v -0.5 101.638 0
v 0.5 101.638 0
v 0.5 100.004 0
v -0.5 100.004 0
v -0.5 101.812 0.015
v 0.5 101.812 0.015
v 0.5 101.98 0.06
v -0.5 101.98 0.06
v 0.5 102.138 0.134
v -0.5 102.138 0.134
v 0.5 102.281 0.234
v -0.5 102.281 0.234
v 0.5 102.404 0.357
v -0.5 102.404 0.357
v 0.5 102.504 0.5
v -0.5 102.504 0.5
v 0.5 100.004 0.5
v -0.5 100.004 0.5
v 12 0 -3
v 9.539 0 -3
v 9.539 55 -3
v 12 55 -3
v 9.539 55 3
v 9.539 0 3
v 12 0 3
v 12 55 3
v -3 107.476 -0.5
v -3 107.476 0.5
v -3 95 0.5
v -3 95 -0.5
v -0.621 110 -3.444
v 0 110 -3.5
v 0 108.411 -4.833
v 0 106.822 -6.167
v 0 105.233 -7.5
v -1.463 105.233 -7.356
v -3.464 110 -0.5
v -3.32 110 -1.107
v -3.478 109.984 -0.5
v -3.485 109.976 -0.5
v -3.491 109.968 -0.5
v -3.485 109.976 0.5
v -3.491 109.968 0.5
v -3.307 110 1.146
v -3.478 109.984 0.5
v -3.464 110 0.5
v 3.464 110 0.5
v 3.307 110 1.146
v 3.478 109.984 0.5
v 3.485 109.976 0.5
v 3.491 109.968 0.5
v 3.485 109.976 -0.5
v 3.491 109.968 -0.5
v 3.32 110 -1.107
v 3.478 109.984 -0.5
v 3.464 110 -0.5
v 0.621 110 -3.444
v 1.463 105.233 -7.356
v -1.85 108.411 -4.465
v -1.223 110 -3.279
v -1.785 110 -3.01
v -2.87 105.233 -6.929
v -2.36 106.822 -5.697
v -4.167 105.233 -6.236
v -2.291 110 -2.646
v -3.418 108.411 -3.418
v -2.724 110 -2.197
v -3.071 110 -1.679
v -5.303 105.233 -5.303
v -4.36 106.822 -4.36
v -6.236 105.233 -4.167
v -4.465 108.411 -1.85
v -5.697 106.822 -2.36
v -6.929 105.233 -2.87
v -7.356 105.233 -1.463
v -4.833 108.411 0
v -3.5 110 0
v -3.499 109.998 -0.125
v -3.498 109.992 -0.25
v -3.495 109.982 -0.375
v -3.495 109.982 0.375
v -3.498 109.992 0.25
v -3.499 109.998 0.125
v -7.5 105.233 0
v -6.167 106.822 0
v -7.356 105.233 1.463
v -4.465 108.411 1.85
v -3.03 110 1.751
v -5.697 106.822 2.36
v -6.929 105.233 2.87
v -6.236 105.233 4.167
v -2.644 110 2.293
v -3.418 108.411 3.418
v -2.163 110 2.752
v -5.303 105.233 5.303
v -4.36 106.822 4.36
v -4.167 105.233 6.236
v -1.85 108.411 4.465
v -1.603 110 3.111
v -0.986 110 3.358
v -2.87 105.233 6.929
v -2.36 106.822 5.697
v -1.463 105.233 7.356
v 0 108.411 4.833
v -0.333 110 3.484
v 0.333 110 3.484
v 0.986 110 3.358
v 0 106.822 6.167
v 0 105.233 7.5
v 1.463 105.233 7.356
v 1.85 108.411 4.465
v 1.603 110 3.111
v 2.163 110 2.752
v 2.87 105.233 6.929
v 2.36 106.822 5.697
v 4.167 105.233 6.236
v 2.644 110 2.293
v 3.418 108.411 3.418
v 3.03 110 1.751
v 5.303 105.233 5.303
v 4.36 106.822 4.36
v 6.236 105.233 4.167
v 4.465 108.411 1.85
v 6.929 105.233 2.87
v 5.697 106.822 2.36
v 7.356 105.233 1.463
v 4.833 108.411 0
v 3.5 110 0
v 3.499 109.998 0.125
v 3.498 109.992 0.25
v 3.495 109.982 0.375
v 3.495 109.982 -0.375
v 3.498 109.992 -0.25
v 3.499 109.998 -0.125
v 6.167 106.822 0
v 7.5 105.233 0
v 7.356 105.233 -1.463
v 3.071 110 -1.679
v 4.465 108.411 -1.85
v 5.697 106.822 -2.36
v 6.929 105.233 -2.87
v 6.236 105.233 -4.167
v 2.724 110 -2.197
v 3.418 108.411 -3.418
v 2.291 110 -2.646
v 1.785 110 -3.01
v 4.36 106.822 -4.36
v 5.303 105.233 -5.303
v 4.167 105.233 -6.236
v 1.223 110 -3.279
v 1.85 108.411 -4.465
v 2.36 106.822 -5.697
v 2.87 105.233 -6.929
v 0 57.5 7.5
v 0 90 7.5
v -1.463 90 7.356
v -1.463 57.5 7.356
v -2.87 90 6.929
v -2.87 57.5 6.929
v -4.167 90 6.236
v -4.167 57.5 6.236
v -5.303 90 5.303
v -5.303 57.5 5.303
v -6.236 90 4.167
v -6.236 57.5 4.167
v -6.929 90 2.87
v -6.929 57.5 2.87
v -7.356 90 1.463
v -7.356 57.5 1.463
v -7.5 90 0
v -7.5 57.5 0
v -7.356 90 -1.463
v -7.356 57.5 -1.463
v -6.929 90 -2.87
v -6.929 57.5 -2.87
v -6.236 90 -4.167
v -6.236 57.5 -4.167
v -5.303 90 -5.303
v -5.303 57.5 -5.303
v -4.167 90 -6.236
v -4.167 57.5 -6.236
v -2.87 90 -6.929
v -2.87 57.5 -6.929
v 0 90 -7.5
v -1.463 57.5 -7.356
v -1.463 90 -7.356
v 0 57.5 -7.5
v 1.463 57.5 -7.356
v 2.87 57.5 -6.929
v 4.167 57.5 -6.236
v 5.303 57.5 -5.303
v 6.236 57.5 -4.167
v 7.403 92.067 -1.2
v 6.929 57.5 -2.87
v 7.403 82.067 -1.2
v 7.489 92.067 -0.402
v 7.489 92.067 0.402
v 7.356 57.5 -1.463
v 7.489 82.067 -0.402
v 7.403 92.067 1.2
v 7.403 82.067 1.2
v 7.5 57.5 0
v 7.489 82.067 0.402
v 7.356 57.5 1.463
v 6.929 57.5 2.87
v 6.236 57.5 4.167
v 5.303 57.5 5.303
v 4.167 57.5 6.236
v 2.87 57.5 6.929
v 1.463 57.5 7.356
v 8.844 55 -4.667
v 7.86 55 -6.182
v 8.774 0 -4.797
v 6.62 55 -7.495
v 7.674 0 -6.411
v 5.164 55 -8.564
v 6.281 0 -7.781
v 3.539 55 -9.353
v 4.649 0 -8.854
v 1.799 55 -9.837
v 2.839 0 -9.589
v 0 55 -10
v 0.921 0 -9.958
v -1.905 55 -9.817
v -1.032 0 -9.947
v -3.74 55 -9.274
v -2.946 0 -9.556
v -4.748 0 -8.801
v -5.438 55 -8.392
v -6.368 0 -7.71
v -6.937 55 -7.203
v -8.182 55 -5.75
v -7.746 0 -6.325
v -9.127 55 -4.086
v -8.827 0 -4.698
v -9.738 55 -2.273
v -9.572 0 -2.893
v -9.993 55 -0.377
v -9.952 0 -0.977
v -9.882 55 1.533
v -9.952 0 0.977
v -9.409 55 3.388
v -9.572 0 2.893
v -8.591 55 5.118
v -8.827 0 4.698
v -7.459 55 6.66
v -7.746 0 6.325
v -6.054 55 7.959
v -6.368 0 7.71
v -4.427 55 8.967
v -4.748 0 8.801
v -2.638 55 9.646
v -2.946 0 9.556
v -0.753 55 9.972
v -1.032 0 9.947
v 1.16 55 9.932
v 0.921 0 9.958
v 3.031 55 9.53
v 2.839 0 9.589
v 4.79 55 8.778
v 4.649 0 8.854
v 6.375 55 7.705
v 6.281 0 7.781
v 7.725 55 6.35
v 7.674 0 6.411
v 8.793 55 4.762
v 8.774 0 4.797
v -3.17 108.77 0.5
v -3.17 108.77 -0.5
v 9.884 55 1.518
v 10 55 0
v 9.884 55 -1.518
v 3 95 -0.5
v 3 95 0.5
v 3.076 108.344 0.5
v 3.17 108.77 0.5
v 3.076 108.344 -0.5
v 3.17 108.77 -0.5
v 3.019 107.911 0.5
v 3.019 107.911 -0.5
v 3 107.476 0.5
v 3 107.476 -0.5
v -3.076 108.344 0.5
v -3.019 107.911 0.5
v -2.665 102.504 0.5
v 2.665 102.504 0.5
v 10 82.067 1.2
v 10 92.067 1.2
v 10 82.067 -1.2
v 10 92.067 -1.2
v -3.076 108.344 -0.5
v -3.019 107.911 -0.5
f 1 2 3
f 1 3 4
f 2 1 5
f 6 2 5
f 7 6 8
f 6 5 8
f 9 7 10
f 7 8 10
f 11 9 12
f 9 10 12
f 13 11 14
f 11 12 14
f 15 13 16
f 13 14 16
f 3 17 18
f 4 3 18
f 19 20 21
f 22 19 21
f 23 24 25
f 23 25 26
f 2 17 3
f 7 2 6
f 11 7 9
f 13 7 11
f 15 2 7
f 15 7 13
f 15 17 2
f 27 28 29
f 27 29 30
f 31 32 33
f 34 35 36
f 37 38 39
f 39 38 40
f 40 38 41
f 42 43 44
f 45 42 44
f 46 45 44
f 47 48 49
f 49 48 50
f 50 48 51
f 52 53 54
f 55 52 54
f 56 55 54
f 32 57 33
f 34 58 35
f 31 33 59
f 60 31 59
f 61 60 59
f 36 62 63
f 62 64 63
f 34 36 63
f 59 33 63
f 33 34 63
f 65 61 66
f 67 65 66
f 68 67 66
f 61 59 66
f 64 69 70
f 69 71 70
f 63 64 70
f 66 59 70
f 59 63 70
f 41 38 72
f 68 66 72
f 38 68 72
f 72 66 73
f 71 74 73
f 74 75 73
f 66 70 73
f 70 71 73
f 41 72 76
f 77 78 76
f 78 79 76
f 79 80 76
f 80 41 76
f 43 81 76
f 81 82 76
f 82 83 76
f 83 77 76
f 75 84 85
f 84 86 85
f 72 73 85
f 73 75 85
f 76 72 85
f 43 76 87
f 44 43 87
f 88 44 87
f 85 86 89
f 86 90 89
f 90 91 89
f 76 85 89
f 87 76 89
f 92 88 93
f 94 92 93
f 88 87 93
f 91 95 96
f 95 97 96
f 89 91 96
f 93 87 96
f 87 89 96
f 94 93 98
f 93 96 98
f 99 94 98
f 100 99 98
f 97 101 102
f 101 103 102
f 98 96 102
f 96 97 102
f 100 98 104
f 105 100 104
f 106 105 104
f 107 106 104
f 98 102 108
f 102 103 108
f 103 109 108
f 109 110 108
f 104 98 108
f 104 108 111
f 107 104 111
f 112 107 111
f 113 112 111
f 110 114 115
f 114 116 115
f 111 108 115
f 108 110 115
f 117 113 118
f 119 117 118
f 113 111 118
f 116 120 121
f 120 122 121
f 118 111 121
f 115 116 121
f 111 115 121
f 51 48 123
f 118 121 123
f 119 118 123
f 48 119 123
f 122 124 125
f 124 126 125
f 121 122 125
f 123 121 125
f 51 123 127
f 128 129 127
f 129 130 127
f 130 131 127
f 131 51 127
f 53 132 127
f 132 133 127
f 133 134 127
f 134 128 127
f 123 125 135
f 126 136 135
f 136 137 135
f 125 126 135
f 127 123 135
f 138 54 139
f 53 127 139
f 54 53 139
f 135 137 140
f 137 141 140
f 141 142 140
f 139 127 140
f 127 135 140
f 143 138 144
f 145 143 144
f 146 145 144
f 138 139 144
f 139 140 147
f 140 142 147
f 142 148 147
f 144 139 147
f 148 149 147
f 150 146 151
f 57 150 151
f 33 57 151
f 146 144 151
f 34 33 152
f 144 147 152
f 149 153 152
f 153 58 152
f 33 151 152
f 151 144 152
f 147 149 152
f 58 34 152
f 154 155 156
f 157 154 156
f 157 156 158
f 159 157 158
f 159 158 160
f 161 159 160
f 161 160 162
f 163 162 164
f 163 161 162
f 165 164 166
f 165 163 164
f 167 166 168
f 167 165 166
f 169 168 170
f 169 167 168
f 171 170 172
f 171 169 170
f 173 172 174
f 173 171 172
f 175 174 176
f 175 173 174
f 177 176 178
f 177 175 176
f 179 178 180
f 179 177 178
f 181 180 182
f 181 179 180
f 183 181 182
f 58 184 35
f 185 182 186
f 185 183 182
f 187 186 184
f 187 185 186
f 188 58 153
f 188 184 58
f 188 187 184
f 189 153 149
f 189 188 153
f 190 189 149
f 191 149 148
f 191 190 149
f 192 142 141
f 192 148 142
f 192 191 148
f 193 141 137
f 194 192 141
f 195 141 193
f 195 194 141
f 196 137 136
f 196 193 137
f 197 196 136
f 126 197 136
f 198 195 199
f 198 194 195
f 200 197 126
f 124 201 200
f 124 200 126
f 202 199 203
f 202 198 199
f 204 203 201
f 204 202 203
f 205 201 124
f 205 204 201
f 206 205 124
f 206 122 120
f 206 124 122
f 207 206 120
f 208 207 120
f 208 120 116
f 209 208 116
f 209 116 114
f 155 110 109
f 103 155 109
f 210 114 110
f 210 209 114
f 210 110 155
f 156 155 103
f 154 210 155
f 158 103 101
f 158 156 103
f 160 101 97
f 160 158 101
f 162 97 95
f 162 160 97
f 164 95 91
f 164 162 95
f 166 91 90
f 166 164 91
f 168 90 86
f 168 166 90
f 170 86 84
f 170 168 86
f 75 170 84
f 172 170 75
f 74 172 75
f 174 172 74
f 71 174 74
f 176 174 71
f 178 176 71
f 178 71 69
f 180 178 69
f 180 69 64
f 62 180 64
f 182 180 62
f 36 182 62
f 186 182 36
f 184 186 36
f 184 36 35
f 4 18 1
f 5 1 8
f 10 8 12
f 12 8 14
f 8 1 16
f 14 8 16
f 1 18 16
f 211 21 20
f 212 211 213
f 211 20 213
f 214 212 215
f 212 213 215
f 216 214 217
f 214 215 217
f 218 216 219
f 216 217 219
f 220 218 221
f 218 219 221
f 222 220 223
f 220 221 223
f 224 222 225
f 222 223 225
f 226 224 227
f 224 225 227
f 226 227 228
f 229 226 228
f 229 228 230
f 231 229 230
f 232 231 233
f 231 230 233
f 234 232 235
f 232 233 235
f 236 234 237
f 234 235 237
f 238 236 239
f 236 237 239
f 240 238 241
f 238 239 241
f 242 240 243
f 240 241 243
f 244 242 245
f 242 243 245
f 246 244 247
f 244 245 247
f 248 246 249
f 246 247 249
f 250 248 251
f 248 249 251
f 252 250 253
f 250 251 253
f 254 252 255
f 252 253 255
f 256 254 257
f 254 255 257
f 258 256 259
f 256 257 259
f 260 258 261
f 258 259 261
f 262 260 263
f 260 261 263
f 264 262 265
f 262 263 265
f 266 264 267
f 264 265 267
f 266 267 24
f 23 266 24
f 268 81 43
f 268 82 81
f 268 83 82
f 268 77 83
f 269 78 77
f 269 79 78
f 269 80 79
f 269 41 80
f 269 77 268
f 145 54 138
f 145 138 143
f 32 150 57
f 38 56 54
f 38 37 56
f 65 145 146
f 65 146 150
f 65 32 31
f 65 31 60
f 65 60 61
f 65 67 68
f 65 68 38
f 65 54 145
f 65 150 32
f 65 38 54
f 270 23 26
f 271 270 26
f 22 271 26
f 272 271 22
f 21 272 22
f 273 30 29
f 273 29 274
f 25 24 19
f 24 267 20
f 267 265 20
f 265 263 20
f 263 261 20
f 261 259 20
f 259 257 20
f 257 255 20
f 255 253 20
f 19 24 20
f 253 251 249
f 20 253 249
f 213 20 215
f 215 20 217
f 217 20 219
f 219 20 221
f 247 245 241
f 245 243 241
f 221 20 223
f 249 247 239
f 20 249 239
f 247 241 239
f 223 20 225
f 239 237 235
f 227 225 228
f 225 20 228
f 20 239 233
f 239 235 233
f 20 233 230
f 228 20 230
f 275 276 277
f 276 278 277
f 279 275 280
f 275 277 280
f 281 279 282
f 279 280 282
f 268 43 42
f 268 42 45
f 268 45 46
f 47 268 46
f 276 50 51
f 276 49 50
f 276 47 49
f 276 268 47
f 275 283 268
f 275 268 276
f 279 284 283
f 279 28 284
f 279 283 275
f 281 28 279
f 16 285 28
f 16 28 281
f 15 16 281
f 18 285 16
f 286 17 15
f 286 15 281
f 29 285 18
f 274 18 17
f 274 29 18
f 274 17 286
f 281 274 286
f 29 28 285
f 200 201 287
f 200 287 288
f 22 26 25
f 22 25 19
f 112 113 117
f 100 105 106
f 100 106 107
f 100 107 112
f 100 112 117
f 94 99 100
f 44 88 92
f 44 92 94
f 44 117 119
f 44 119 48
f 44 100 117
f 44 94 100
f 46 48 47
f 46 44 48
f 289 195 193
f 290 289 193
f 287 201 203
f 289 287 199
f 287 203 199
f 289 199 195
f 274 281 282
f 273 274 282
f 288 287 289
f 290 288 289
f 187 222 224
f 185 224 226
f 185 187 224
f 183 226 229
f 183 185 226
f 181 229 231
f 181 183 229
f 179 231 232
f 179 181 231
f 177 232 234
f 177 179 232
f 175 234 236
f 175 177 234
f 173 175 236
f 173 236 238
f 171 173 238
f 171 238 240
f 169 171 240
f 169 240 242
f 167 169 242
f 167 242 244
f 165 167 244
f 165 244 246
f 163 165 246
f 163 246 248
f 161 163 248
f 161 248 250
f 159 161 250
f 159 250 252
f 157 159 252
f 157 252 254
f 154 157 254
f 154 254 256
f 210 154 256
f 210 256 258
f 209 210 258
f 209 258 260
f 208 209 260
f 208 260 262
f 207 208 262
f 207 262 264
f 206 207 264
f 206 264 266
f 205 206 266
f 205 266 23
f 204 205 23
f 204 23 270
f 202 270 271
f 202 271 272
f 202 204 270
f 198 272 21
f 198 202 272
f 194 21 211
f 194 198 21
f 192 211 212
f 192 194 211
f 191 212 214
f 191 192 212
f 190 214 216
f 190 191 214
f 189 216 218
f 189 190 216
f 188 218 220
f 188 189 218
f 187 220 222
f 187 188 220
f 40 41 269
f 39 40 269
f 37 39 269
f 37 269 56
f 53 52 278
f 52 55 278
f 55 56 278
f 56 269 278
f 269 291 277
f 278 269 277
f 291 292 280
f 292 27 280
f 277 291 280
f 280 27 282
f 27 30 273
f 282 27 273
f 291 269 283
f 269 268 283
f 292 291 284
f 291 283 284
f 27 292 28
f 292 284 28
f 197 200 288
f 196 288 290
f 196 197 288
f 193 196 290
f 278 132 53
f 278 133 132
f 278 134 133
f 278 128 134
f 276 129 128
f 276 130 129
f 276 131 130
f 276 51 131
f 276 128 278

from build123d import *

# Parameters (mm, degrees)
SKETCH1_R           = 10
BOSS_EXTRUDE1_DEPTH = 60
SKETCH2_R           = 7.5
BOSS_EXTRUDE2_DEPTH = 30
CHAMFER2_SIZE       = 5
SKETCH3_R           = 7.5
BOSS_EXTRUDE3_DEPTH = 20
CHAMFER3_SIZE       = 4
CHAMFER3_SIZE2      = 4.76701437
SKETCH5_W           = 6
SKETCH5_H           = 55
BOSS_EXTRUDE5_DEPTH = 12
SKETCH6_W           = 2.4
SKETCH6_H           = 10
BOSS_EXTRUDE6_DEPTH = 10
SKETCH13_W          = 6
SKETCH13_H          = 1
CUT_EXTRUDE2_DEPTH  = 10
SKETCH14_W          = 6
SKETCH14_H          = 1
CUT_EXTRUDE3_DEPTH  = 5
CHAMFER22_SIZE      = 0.5
CHAMFER22_SIZE_2    = 1.866025404
SKETCH17_W          = 1
SKETCH17_H          = 2.5
BOSS_EXTRUDE7_DEPTH = 0.5
FILLET1_R           = 1
FILLET2_R           = 5


with BuildPart() as part:
    # Sketch1 → Boss-Extrude1 (new body)
    with BuildSketch(Plane(origin=(0, 0, 0), x_dir=(1, 0, 0), z_dir=(0, 1, 0))):
        with Locations(Location((0, 0, 0), (0, 0, 90))):
            Circle(SKETCH1_R)
    extrude(amount=BOSS_EXTRUDE1_DEPTH)

    # Sketch2 → Boss-Extrude2 (add)
    with BuildSketch(Plane(origin=(0, 60, 0), x_dir=(1, 0, 0), z_dir=(0, 1, 0))):
        with Locations(Location((0, 0, 0), (0, 0, 270))):
            Circle(SKETCH2_R)
    extrude(amount=BOSS_EXTRUDE2_DEPTH)

    # Chamfer2
    # the kernel refuses this chamfer: 5 mm, written as the material it takes off along each edge
    with BuildSketch(Plane(origin=(0, 60, 0), x_dir=(0, 0, -1), z_dir=(1, 0, 0))) as chamfer2_piece_1_section:
        Polygon((10, -CHAMFER2_SIZE), (10 - CHAMFER2_SIZE, 0), (10, 0), align=None)
    chamfer2_piece_1 = revolve(axis=Axis((0, 60, 0), (0, 1, 0)), mode=Mode.PRIVATE)
    chamfer2_piece_1 = chamfer2_piece_1 - Plane(origin=(0, 56.238108378, 0), x_dir=(0, 0, 1), z_dir=(0, -1, 0)) * Cylinder(7.5, 40, mode=Mode.PRIVATE)
    add(chamfer2_piece_1, mode=Mode.SUBTRACT)

    # Sketch3 → Boss-Extrude3 (add)
    with BuildSketch(Plane(origin=(0, 90, 0), x_dir=(1, 0, 0), z_dir=(0, 1, 0))):
        with Locations(Location((0, 0, 0), (0, 0, 90))):
            Circle(SKETCH3_R)
    extrude(amount=BOSS_EXTRUDE3_DEPTH)

    # Chamfer3
    chamfer3_edges = [part.edges().sort_by_distance(p)[0] for p in [
        (0, 110, 7.5),
    ]]
    chamfer3_side = [part.faces().sort_by_distance(p)[0] for p in [
        (0, 110, 0),
    ]]
    chamfer(chamfer3_edges, length=CHAMFER3_SIZE, length2=CHAMFER3_SIZE2, reference=chamfer3_side[0])

    # Sketch5 → Boss-Extrude5 (add)
    with BuildSketch(Plane(origin=(0, 0, 0), x_dir=(0, 0, -1), z_dir=(1, 0, 0))):
        with Locations((0, 27.5)):
            Rectangle(SKETCH5_W, SKETCH5_H)
    extrude(amount=BOSS_EXTRUDE5_DEPTH)

    # Sketch6 → Boss-Extrude6 (add)
    with BuildSketch(Plane(origin=(0, 0, 0), x_dir=(0, 0, -1), z_dir=(1, 0, 0))):
        with Locations((0, 87.067071975)):
            Rectangle(SKETCH6_W, SKETCH6_H)
    extrude(amount=BOSS_EXTRUDE6_DEPTH)

    # Sketch13 → Cut-Extrude2 (cut)
    with BuildSketch(Plane(origin=(0, 110, 0), x_dir=(1, 0, 0), z_dir=(0, 1, 0))):
        Rectangle(SKETCH13_W, SKETCH13_H)
    extrude(amount=-CUT_EXTRUDE2_DEPTH, mode=Mode.SUBTRACT)

    # Sketch14 → Cut-Extrude3 (cut)
    with BuildSketch(Plane(origin=(0, 100, 0), x_dir=(1, 0, 0), z_dir=(0, 1, 0))):
        Rectangle(SKETCH14_W, SKETCH14_H)
    extrude(amount=-CUT_EXTRUDE3_DEPTH, mode=Mode.SUBTRACT)

    # Chamfer22
    # the kernel refuses this chamfer: 1.866025404, 0.5 mm, written as the material it takes off along each edge
    with BuildSketch(Plane(origin=(3, 110, 0.5), x_dir=(0.9905000388259552, 0.13751244702128432, 0), z_dir=(0, 0, -1)), Plane(origin=(-3, 110, -0.5), x_dir=(-0.9905000388259552, 0.13751244702128432, 0), z_dir=(0, 0, 1))) as chamfer22_piece_1:
        Polygon((CHAMFER22_SIZE * 0.990500038826, CHAMFER22_SIZE * 0.137512447021), (-CHAMFER22_SIZE_2 * 0.137512447005, CHAMFER22_SIZE_2 * 0.990500038712), (0, 0), align=None)
    extrude(amount=1, mode=Mode.SUBTRACT)

    # Sketch17 → Boss-Extrude7 (add)
    with BuildSketch(Plane(origin=(0, 0, 0.5), x_dir=(-1, 0, 0), z_dir=(0, 0, -1))):
        with Locations((0, 101.254046964)):
            Rectangle(SKETCH17_W, SKETCH17_H)
    extrude(amount=BOSS_EXTRUDE7_DEPTH)

    # Fillet1
    # the kernel refuses this fillet: 1 mm, written as the material it takes off along each edge
    with BuildSketch(Plane(origin=(-2.665063509, 102.504046964, 0), x_dir=(0, 0, 1), z_dir=(1, 0, 0))) as fillet1_piece_1:
        with BuildLine():
            CenterArc((1, 0.866025404), FILLET1_R, 180, 60)
            Line((0, 0.866025404), (-0.02, 0.866025404))
            Line((-0.02, 0.866025404), (-0.02, 0))
            Line((-0.02, 0), (0, -0.02))
            ThreePointArc((0, -0.02), (0.25, -0.02), (0.49, -0.017320508))
            Line((0.49, -0.017320508), (0.5, 0))
        make_face()
    extrude(amount=5.330127019, mode=Mode.SUBTRACT)

    # Fillet2
    fillet2_edges = [part.edges().sort_by_distance(p)[0] for p in [
        (3, 108.133974596, 0),
        (-3, 108.133974596, 0),
    ]]
    fillet(fillet2_edges, radius=FILLET2_R)


solid = part.part
